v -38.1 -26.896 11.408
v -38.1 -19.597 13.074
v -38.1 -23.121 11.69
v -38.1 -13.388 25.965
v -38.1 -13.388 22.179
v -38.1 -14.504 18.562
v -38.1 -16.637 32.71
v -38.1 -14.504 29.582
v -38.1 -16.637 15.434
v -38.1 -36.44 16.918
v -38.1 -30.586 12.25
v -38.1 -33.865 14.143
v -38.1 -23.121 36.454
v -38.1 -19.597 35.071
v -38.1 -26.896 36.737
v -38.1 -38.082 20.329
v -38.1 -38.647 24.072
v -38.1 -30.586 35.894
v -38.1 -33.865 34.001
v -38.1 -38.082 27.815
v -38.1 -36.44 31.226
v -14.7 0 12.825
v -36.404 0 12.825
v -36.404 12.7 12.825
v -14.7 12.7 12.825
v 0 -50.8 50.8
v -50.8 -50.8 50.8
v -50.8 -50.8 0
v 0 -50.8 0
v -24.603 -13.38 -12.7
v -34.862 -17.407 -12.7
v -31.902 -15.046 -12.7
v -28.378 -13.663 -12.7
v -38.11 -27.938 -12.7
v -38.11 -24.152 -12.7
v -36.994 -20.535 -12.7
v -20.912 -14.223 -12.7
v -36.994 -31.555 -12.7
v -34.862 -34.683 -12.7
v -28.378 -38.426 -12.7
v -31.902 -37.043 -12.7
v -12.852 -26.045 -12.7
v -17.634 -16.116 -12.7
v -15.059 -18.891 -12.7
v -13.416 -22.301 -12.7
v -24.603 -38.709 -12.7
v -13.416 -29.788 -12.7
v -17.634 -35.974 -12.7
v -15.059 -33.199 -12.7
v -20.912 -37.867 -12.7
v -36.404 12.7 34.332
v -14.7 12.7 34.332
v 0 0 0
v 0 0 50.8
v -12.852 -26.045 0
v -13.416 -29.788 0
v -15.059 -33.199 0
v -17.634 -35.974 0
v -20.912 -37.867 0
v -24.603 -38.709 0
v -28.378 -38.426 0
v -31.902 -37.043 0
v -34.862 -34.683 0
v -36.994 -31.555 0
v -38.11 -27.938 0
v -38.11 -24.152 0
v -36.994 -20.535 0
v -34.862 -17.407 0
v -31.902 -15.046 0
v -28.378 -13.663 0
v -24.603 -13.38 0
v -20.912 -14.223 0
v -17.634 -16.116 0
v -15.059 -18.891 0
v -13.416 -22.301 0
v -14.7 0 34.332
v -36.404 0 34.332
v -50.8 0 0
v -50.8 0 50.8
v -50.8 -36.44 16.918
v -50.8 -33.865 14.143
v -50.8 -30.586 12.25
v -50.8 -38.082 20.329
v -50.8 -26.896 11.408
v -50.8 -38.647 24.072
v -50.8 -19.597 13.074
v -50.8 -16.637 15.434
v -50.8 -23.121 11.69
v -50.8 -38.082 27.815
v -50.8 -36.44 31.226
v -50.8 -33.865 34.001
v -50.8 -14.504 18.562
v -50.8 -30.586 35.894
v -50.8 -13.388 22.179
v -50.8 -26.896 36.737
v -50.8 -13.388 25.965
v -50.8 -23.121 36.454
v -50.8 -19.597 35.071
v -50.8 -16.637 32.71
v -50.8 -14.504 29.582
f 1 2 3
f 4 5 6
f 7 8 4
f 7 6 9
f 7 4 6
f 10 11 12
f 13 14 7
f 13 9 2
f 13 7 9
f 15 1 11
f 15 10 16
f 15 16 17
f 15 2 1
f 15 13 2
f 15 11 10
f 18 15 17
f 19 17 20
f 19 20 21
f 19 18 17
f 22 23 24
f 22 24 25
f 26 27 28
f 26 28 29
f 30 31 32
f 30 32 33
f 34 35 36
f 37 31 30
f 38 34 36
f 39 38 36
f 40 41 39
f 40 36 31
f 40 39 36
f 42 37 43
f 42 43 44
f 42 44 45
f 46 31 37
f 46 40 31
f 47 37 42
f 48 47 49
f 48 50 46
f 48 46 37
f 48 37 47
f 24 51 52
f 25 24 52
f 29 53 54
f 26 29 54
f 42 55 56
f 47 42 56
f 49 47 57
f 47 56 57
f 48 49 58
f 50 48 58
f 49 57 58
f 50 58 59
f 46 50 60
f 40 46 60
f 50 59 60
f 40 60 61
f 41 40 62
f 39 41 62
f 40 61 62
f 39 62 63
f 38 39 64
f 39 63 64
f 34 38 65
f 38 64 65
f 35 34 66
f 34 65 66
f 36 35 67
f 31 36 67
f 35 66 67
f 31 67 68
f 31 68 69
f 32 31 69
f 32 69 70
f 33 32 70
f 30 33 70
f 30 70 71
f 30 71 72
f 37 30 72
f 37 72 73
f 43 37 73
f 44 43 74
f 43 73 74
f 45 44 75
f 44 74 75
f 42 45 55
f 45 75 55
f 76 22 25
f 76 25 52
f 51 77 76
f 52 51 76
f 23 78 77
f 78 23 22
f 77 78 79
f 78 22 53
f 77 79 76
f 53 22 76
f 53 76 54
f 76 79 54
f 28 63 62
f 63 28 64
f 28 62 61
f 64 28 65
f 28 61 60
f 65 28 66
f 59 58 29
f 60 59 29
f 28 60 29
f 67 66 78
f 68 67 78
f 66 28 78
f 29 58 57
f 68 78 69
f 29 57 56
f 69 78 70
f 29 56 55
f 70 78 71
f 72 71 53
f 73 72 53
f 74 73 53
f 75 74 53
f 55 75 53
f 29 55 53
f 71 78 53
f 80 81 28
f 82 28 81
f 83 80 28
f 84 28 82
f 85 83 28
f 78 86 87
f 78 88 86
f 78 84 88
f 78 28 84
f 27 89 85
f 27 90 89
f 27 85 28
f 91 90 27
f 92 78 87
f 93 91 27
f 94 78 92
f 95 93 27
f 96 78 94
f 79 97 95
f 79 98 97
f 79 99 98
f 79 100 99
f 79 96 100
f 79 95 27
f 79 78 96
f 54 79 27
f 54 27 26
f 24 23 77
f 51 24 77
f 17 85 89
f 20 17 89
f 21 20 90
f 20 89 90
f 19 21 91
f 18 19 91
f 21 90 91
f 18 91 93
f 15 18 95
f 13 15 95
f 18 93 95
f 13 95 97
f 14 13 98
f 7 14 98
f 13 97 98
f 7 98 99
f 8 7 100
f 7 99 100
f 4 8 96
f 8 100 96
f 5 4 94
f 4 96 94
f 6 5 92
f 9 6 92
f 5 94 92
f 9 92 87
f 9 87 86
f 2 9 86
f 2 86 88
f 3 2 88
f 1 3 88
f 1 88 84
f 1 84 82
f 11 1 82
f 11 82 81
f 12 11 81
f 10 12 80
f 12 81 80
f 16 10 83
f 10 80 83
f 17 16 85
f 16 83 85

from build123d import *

# Parameters (mm, degrees)
F0_W     = 50.8
F0_H     = 50.8
F1_DEPTH = 50.8
F2_W     = 21.704316
F2_H     = 21.507005
F3_DEPTH = 12.7
F4_R     = 12.7
F5_DEPTH = 12.7
F6_R     = 12.7
F7_DEPTH = 12.7


with BuildPart() as f1:
    # F0 (on Front) → F1 (new body)
    with BuildSketch(Plane.XZ):
        with Locations((-25.4, 25.4)):
            Rectangle(F0_W, F0_H)
    extrude(amount=F1_DEPTH)

    # F2 (on Front) → F3 (join)
    with BuildSketch(Plane.XZ):
        with Locations((-25.5519, 23.57878)):
            Rectangle(F2_W, F2_H)
    extrude(amount=-F3_DEPTH)

    # F4 (on face) → F5 (cut)
    with BuildSketch(Plane(origin=(-50.8, 0, 0), x_dir=(0, -1, 0), z_dir=(-1, 0, 0))):
        with Locations((25.946522, 24.07206)):
            Circle(F4_R)
    extrude(amount=-F5_DEPTH, mode=Mode.SUBTRACT)

    # F6 (on face) → F7 (join)
    with BuildSketch(Plane(origin=(0, 0, 0), x_dir=(1, 0, 0), z_dir=(0, 0, -1))):
        with Locations((-25.551898, 26.044877)):
            Circle(F6_R)
    extrude(amount=F7_DEPTH)


solid = f1.part
